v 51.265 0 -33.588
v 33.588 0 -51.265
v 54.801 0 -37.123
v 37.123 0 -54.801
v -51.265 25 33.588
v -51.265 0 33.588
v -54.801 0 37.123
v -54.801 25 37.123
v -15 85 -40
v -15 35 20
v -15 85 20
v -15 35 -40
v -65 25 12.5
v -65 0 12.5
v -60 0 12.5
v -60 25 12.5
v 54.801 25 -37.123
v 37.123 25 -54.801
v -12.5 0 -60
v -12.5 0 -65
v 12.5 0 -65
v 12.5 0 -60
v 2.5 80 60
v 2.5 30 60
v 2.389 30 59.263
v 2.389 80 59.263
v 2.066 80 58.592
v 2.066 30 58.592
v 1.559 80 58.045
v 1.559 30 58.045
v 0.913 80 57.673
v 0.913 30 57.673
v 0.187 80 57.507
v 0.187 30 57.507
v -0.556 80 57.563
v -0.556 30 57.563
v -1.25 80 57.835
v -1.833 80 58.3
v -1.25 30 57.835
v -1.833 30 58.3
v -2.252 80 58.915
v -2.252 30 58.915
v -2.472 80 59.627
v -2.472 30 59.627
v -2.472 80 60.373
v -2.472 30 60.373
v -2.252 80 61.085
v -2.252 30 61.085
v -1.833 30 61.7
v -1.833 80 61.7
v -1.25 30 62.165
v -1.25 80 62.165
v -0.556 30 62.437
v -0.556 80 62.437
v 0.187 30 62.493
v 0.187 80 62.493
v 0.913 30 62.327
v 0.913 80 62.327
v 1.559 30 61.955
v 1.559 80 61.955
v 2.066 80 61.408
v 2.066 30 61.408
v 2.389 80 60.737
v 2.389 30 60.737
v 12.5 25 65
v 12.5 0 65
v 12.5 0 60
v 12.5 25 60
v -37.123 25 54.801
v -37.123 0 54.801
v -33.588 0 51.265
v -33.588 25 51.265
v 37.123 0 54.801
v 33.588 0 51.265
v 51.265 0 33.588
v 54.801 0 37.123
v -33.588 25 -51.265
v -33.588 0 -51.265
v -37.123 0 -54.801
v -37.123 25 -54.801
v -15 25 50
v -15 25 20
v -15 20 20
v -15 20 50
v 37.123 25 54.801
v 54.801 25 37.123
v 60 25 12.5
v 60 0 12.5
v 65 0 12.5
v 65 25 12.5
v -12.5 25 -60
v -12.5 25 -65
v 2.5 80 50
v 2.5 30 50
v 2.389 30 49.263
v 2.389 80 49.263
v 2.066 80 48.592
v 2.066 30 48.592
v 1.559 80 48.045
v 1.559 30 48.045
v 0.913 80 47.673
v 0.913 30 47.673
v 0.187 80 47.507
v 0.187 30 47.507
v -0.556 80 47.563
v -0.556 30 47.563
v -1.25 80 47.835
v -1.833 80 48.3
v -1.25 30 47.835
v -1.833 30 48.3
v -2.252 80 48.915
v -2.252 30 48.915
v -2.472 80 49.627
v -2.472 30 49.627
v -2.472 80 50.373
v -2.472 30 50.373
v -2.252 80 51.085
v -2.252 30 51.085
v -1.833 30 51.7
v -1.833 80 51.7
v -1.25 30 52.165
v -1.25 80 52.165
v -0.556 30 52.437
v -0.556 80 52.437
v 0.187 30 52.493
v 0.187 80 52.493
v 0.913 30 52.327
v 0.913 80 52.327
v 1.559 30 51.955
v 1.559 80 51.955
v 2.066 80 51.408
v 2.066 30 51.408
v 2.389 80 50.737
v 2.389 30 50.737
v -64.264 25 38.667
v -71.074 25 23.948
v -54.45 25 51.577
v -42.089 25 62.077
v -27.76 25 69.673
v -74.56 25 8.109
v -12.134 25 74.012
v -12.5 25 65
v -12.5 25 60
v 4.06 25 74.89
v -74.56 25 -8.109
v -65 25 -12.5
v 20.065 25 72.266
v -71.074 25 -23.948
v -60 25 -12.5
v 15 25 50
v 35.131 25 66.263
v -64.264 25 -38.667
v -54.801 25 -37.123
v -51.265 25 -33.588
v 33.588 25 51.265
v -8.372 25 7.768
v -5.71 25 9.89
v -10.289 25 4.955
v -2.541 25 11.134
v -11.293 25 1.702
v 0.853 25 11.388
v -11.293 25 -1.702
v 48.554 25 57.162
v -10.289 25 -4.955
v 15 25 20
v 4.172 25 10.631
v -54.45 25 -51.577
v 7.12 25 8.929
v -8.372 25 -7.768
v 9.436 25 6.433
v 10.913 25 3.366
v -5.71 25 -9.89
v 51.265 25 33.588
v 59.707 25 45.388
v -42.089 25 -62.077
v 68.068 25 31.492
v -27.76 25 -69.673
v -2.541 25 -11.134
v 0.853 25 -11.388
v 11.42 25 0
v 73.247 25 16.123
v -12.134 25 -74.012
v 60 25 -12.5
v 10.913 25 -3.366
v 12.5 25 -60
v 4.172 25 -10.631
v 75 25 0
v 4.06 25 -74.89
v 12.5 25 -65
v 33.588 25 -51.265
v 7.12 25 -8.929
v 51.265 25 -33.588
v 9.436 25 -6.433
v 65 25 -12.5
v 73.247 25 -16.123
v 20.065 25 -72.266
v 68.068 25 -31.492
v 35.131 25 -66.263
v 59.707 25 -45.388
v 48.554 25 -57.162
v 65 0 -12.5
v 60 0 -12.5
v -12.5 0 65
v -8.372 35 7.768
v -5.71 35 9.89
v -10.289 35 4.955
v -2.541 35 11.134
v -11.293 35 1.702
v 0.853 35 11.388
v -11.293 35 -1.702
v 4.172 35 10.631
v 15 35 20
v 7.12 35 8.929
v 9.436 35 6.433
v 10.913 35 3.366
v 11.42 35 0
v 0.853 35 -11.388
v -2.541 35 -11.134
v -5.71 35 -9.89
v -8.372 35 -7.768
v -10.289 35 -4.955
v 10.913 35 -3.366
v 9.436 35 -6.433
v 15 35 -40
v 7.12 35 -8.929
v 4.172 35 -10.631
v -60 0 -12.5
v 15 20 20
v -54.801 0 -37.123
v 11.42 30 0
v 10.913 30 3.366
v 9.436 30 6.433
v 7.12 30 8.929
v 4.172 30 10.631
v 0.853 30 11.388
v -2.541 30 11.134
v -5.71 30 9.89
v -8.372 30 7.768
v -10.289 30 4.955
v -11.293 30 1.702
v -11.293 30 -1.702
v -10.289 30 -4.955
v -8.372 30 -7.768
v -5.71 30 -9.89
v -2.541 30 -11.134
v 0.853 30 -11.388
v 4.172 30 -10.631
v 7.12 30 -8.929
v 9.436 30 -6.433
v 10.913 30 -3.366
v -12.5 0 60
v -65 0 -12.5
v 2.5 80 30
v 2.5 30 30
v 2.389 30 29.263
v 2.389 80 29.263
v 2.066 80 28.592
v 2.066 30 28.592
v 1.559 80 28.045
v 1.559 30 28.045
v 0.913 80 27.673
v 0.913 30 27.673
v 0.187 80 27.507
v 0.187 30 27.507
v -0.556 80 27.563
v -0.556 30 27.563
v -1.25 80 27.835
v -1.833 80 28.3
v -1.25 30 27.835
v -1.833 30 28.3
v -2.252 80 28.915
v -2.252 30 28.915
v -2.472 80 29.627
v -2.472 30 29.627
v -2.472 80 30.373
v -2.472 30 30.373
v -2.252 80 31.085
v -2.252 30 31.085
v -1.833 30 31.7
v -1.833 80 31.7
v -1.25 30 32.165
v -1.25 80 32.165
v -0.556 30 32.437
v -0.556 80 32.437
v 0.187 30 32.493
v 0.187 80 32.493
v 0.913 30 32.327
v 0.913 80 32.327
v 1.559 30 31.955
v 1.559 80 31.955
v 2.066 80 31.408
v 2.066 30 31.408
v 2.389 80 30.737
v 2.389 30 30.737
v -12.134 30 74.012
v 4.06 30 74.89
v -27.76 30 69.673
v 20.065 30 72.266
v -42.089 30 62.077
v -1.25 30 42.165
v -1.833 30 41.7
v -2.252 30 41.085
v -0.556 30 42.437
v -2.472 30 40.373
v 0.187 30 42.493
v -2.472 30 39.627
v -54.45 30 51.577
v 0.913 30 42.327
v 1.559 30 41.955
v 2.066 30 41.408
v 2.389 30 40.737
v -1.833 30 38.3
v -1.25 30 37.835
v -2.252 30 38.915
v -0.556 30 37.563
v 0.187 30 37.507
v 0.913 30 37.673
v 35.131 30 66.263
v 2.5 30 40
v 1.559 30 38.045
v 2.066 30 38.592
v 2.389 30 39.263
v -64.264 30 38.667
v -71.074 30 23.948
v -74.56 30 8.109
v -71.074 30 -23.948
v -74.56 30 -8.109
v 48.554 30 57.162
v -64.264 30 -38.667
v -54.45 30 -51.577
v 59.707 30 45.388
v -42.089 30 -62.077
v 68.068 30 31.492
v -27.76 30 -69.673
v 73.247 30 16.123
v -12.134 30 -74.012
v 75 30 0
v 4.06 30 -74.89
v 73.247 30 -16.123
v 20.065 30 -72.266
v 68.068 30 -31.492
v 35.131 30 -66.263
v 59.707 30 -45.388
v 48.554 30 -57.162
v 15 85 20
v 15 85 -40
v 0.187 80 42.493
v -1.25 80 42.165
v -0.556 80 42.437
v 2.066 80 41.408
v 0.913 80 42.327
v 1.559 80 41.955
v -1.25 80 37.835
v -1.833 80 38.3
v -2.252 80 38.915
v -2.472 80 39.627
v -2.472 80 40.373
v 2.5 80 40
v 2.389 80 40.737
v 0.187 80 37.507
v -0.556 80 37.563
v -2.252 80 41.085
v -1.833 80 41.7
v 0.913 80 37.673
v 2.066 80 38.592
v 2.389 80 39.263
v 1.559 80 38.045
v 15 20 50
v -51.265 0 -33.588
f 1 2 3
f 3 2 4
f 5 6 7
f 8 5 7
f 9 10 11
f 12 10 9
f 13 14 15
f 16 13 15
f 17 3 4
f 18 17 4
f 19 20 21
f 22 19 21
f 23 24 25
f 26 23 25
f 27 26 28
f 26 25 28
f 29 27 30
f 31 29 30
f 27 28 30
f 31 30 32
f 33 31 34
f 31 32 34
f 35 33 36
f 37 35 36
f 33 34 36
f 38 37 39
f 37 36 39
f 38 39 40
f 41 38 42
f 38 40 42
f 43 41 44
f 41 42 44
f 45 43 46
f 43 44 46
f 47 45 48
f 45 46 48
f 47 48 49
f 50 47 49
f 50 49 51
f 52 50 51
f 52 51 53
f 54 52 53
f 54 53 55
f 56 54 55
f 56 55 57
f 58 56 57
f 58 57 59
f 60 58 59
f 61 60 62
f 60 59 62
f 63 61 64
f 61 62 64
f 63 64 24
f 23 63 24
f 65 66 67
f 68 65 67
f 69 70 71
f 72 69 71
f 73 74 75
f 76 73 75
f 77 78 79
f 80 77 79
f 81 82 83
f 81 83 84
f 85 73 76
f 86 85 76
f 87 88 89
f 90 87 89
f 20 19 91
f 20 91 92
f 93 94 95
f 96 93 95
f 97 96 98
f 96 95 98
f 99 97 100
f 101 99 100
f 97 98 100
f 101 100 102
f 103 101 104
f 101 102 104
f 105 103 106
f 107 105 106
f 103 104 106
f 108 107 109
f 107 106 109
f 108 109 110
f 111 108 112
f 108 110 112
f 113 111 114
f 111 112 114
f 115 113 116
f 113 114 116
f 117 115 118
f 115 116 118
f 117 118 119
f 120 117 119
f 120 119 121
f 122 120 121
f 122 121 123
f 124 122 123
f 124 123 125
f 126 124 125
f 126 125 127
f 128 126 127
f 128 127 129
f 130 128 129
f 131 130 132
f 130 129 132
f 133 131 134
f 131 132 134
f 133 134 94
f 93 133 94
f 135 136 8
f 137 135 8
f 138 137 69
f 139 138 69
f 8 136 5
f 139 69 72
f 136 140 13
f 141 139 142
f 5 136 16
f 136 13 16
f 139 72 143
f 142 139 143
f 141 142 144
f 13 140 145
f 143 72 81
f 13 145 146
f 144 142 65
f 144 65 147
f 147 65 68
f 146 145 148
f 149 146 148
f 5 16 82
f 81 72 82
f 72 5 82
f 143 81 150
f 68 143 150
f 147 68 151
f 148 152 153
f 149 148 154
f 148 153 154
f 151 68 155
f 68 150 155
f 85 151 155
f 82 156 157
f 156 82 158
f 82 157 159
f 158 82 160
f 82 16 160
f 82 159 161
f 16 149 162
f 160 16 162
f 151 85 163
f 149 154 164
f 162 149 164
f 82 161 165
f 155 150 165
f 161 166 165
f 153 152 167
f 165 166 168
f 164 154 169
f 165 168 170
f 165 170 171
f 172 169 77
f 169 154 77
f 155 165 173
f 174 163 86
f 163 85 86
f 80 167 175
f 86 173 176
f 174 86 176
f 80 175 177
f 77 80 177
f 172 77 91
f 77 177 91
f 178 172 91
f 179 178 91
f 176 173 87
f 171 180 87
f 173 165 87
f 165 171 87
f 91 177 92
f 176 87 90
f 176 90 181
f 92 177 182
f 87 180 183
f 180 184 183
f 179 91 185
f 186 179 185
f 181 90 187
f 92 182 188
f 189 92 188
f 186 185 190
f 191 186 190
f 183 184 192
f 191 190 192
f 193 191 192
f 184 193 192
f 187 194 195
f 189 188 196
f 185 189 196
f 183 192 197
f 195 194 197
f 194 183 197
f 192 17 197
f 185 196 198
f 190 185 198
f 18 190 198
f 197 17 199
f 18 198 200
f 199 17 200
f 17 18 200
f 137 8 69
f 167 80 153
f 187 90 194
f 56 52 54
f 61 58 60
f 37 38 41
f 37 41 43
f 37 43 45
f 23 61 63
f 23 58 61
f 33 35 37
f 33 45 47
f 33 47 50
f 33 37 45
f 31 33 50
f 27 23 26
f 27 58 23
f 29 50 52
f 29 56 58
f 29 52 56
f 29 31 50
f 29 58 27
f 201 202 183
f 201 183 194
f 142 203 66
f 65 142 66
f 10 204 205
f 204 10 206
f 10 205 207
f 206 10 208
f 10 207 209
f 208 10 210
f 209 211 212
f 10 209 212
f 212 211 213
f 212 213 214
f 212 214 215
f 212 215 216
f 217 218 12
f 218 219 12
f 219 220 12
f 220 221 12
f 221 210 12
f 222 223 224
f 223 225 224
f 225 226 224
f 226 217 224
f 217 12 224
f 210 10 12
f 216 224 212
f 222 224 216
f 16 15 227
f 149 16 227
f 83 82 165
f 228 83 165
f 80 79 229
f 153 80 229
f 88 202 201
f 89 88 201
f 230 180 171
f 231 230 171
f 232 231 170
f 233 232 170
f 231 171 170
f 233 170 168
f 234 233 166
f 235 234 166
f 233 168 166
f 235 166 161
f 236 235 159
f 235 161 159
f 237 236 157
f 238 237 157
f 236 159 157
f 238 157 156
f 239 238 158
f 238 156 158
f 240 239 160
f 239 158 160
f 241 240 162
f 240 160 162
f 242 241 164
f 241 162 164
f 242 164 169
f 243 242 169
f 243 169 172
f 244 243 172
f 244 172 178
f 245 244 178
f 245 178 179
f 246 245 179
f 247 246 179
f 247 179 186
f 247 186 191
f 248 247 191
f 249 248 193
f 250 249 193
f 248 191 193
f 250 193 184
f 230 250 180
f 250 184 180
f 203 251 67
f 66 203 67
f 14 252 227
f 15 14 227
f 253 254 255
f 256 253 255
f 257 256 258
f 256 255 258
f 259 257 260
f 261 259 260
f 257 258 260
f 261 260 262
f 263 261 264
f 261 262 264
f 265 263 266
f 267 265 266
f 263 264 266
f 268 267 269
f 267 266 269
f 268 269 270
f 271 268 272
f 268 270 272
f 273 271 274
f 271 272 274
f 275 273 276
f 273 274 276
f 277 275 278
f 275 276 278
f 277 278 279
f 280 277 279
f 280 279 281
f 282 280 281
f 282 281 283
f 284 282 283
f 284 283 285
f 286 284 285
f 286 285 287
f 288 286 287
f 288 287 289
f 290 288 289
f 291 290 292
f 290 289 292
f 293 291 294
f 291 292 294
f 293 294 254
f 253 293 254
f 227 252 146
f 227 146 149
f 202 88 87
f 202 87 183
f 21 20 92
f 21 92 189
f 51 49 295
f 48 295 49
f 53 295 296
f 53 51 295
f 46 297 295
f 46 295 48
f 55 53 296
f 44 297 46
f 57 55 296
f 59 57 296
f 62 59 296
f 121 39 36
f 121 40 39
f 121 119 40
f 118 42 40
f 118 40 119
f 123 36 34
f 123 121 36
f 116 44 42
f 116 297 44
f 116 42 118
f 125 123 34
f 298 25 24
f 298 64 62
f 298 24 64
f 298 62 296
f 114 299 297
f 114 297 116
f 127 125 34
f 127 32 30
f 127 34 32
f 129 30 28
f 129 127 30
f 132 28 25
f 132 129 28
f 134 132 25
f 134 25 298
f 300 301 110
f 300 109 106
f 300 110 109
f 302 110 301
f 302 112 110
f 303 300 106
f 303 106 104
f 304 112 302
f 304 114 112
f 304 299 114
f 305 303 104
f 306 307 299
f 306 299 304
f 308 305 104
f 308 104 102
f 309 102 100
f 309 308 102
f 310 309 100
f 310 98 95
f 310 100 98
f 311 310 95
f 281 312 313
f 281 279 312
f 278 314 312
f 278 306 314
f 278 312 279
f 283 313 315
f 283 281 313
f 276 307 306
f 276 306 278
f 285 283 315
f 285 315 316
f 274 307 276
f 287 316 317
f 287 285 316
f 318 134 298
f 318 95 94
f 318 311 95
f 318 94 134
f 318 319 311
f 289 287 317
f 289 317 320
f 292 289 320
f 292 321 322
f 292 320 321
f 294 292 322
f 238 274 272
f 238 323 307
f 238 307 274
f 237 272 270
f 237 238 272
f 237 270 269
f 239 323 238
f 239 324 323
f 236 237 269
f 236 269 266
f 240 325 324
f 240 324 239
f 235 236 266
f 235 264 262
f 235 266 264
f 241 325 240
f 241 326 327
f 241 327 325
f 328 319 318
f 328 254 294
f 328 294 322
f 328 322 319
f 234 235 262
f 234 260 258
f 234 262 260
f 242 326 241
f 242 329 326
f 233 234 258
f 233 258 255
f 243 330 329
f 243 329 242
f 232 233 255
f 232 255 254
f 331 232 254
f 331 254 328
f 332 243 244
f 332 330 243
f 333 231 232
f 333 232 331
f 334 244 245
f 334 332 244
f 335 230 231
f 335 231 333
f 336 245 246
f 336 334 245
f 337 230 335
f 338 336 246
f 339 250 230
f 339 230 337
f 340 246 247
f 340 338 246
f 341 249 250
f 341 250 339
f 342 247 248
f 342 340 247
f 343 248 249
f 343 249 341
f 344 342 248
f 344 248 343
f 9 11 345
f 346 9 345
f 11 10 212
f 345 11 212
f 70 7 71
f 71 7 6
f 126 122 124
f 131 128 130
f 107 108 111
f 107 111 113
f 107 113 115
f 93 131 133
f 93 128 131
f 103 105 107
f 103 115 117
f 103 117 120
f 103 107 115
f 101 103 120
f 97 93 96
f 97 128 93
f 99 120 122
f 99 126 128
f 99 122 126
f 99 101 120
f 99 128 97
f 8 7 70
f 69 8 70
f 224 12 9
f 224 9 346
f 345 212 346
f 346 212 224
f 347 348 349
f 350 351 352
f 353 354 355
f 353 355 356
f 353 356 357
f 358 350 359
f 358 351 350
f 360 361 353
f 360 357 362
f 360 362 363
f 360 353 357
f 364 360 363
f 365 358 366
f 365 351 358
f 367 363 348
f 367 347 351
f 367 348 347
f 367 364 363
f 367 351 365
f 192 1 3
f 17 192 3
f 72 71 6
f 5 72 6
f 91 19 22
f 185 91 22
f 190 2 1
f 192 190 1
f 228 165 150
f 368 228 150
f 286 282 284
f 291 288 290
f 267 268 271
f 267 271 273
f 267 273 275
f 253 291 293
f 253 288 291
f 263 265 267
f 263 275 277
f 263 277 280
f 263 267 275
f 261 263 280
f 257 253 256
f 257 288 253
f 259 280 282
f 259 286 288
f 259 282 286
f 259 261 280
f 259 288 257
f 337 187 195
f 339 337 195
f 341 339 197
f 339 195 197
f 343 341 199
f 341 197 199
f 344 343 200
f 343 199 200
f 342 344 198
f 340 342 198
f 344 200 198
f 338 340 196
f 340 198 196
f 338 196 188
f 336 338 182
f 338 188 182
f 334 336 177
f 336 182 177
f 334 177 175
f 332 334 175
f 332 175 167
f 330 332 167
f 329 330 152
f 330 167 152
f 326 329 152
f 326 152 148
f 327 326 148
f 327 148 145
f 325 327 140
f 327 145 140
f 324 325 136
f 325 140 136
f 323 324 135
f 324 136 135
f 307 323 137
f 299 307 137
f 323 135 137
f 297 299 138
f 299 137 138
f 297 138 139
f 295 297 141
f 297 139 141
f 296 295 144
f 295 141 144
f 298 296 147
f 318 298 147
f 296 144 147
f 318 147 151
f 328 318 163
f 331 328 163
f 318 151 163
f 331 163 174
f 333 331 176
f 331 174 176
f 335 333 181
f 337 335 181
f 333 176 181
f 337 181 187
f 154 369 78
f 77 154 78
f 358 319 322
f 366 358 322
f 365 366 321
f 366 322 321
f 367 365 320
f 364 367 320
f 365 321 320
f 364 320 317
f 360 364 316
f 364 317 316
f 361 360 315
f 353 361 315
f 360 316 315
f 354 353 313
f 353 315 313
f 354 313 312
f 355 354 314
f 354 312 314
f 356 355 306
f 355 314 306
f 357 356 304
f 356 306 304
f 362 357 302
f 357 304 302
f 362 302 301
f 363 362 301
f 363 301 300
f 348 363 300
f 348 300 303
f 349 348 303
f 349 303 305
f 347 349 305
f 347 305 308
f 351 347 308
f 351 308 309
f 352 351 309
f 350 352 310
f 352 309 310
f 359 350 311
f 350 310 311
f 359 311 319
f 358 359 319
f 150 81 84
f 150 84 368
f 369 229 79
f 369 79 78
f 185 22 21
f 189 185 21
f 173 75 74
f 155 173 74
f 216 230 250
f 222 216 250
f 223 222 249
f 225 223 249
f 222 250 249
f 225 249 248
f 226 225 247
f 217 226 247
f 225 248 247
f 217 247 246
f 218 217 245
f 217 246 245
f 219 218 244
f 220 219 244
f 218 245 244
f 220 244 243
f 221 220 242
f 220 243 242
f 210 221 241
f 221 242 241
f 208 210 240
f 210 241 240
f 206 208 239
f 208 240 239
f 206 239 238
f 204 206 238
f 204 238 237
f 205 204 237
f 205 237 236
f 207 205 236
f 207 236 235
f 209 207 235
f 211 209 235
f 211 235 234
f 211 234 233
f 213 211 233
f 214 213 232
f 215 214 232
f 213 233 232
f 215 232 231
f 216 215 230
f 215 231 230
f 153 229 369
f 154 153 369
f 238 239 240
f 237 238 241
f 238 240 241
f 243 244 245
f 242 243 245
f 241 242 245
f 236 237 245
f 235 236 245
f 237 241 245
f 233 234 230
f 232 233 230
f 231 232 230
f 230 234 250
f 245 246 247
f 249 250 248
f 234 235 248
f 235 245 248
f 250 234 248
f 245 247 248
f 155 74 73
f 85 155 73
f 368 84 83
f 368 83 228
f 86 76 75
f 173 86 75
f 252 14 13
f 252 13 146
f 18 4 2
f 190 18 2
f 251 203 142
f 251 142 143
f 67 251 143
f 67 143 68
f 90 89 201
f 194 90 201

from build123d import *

# Parameters (mm, degrees)
BOSS_EXTRUDE1_DEPTH   = 25
BOSS_EXTRUDE1_2_DEPTH = 25
SKETCH1_W             = 25
SKETCH1_H             = 5
BOSS_EXTRUDE1_3_DEPTH = 25
BOSS_EXTRUDE1_4_DEPTH = 25
SKETCH1_W_2           = 5
SKETCH1_H_2           = 25
BOSS_EXTRUDE1_5_DEPTH = 25
BOSS_EXTRUDE1_6_DEPTH = 25
BOSS_EXTRUDE1_7_DEPTH = 25
BOSS_EXTRUDE1_8_DEPTH = 25
SKETCH2_R             = 75
BOSS_EXTRUDE2_DEPTH   = 5
SKETCH3_W             = 30
SKETCH3_H             = 30
BOSS_EXTRUDE3_DEPTH   = 5
SKETCH4_R             = 11.420268363
CUT_EXTRUDE1_DEPTH    = 5
SKETCH5_R             = 11.420268363
BOSS_EXTRUDE4_DEPTH   = 5
SKETCH6_W             = 30
SKETCH6_H             = 60
BOSS_EXTRUDE5_DEPTH   = 50
SKETCH7_R             = 2.5
BOSS_EXTRUDE6_DEPTH   = 50


with BuildPart() as part:
    # Sketch1 → Boss-Extrude1 (new body)
    with BuildSketch(Plane(origin=(0, 0, 0), x_dir=(1, 0, 0), z_dir=(0, 1, 0))):
        Polygon((-37.123106012, -54.800775542), (-33.587572106, -51.265241636), (-51.265241636, -33.587572106), (-54.800775542, -37.123106012), align=None)
    extrude(amount=BOSS_EXTRUDE1_DEPTH)



with BuildPart() as body_2:
    # Sketch1 → Boss-Extrude1 2 (new body)
    with BuildSketch(Plane(origin=(0, 0, 0), x_dir=(1, 0, 0), z_dir=(0, 1, 0))):
        Polygon((-54.800775542, 37.123106012), (-51.265241636, 33.587572106), (-33.587572106, 51.265241636), (-37.123106012, 54.800775542), align=None)
    extrude(amount=BOSS_EXTRUDE1_2_DEPTH)


with BuildPart() as body_3:
    # Sketch1 → Boss-Extrude1 3 (new body)
    with BuildSketch(Plane(origin=(0, 0, 0), x_dir=(1, 0, 0), z_dir=(0, 1, 0))):
        with Locations((0, 62.5)):
            Rectangle(SKETCH1_W, SKETCH1_H)
    extrude(amount=BOSS_EXTRUDE1_3_DEPTH)


with BuildPart() as body_4:
    # Sketch1 → Boss-Extrude1 4 (new body)
    with BuildSketch(Plane(origin=(0, 0, 0), x_dir=(1, 0, 0), z_dir=(0, 1, 0))):
        Polygon((37.123106012, 54.800775542), (33.587572106, 51.265241636), (51.265241636, 33.587572106), (54.800775542, 37.123106012), align=None)
    extrude(amount=BOSS_EXTRUDE1_4_DEPTH)


with BuildPart() as body_5:
    # Sketch1 → Boss-Extrude1 5 (new body)
    with BuildSketch(Plane(origin=(0, 0, 0), x_dir=(1, 0, 0), z_dir=(0, 1, 0))):
        with Locations((62.5, 0)):
            Rectangle(SKETCH1_W_2, SKETCH1_H_2)
    extrude(amount=BOSS_EXTRUDE1_5_DEPTH)


with BuildPart() as body_6:
    # Sketch1 → Boss-Extrude1 6 (new body)
    with BuildSketch(Plane(origin=(0, 0, 0), x_dir=(1, 0, 0), z_dir=(0, 1, 0))):
        Polygon((54.800775542, -37.123106012), (51.265241636, -33.587572106), (33.587572106, -51.265241636), (37.123106012, -54.800775542), align=None)
    extrude(amount=BOSS_EXTRUDE1_6_DEPTH)


with BuildPart() as body_7:
    # Sketch1 → Boss-Extrude1 7 (new body)
    with BuildSketch(Plane(origin=(0, 0, 0), x_dir=(1, 0, 0), z_dir=(0, 1, 0))):
        with Locations((0, -62.5)):
            Rectangle(SKETCH1_W, SKETCH1_H)
    extrude(amount=BOSS_EXTRUDE1_7_DEPTH)


with BuildPart() as body_8:
    # Sketch1 → Boss-Extrude1 8 (new body)
    with BuildSketch(Plane(origin=(0, 0, 0), x_dir=(1, 0, 0), z_dir=(0, 1, 0))):
        with Locations((-62.5, 0)):
            Rectangle(SKETCH1_W_2, SKETCH1_H_2)
    extrude(amount=BOSS_EXTRUDE1_8_DEPTH)


with BuildPart() as part_1:
    add(part.part)

    add(body_2.part)  # Boss-Extrude2 merges body 2

    add(body_3.part)  # Boss-Extrude2 merges body 3

    add(body_4.part)  # Boss-Extrude2 merges body 4

    add(body_5.part)  # Boss-Extrude2 merges body 5

    add(body_6.part)  # Boss-Extrude2 merges body 6

    add(body_7.part)  # Boss-Extrude2 merges body 7

    add(body_8.part)  # Boss-Extrude2 merges body 8
    # Sketch2 → Boss-Extrude2 (add)
    with BuildSketch(Plane(origin=(0, 25, 0), x_dir=(1, 0, 0), z_dir=(0, 1, 0))):
        Circle(SKETCH2_R)
    extrude(amount=BOSS_EXTRUDE2_DEPTH)

    # Sketch3 → Boss-Extrude3 (add)
    with BuildSketch(Plane.XZ.offset(-25)):
        with Locations((0, 35)):
            Rectangle(SKETCH3_W, SKETCH3_H)
    extrude(amount=BOSS_EXTRUDE3_DEPTH)

    # Sketch4 → Cut-Extrude1 (cut)
    with BuildSketch(Plane.XZ.offset(-25)):
        Circle(SKETCH4_R)
    extrude(amount=-CUT_EXTRUDE1_DEPTH, mode=Mode.SUBTRACT)

    # Sketch7 → Boss-Extrude6 (add)
    with BuildSketch(Plane(origin=(0, 30, 0), x_dir=(1, 0, 0), z_dir=(0, 1, 0))):
        with Locations((0, -30)):
            Circle(SKETCH7_R)
        with Locations((0, -40)):
            Circle(SKETCH7_R)
        with Locations((0, -50)):
            Circle(SKETCH7_R)
        with Locations((0, -60)):
            Circle(SKETCH7_R)
    extrude(amount=BOSS_EXTRUDE6_DEPTH)


with BuildPart() as body_2_2:
    # Sketch5 → Boss-Extrude4 (new body)
    with BuildSketch(Plane(origin=(0, 30, 0), x_dir=(1, 0, 0), z_dir=(0, 1, 0))):
        Circle(SKETCH5_R)
    extrude(amount=BOSS_EXTRUDE4_DEPTH)

    # Sketch6 → Boss-Extrude5 (add)
    with BuildSketch(Plane(origin=(0, 35, 0), x_dir=(1, 0, 0), z_dir=(0, 1, 0))):
        with Locations((0, 10)):
            Rectangle(SKETCH6_W, SKETCH6_H)
    extrude(amount=BOSS_EXTRUDE5_DEPTH)


solid = Compound([part_1.part, body_2_2.part])
